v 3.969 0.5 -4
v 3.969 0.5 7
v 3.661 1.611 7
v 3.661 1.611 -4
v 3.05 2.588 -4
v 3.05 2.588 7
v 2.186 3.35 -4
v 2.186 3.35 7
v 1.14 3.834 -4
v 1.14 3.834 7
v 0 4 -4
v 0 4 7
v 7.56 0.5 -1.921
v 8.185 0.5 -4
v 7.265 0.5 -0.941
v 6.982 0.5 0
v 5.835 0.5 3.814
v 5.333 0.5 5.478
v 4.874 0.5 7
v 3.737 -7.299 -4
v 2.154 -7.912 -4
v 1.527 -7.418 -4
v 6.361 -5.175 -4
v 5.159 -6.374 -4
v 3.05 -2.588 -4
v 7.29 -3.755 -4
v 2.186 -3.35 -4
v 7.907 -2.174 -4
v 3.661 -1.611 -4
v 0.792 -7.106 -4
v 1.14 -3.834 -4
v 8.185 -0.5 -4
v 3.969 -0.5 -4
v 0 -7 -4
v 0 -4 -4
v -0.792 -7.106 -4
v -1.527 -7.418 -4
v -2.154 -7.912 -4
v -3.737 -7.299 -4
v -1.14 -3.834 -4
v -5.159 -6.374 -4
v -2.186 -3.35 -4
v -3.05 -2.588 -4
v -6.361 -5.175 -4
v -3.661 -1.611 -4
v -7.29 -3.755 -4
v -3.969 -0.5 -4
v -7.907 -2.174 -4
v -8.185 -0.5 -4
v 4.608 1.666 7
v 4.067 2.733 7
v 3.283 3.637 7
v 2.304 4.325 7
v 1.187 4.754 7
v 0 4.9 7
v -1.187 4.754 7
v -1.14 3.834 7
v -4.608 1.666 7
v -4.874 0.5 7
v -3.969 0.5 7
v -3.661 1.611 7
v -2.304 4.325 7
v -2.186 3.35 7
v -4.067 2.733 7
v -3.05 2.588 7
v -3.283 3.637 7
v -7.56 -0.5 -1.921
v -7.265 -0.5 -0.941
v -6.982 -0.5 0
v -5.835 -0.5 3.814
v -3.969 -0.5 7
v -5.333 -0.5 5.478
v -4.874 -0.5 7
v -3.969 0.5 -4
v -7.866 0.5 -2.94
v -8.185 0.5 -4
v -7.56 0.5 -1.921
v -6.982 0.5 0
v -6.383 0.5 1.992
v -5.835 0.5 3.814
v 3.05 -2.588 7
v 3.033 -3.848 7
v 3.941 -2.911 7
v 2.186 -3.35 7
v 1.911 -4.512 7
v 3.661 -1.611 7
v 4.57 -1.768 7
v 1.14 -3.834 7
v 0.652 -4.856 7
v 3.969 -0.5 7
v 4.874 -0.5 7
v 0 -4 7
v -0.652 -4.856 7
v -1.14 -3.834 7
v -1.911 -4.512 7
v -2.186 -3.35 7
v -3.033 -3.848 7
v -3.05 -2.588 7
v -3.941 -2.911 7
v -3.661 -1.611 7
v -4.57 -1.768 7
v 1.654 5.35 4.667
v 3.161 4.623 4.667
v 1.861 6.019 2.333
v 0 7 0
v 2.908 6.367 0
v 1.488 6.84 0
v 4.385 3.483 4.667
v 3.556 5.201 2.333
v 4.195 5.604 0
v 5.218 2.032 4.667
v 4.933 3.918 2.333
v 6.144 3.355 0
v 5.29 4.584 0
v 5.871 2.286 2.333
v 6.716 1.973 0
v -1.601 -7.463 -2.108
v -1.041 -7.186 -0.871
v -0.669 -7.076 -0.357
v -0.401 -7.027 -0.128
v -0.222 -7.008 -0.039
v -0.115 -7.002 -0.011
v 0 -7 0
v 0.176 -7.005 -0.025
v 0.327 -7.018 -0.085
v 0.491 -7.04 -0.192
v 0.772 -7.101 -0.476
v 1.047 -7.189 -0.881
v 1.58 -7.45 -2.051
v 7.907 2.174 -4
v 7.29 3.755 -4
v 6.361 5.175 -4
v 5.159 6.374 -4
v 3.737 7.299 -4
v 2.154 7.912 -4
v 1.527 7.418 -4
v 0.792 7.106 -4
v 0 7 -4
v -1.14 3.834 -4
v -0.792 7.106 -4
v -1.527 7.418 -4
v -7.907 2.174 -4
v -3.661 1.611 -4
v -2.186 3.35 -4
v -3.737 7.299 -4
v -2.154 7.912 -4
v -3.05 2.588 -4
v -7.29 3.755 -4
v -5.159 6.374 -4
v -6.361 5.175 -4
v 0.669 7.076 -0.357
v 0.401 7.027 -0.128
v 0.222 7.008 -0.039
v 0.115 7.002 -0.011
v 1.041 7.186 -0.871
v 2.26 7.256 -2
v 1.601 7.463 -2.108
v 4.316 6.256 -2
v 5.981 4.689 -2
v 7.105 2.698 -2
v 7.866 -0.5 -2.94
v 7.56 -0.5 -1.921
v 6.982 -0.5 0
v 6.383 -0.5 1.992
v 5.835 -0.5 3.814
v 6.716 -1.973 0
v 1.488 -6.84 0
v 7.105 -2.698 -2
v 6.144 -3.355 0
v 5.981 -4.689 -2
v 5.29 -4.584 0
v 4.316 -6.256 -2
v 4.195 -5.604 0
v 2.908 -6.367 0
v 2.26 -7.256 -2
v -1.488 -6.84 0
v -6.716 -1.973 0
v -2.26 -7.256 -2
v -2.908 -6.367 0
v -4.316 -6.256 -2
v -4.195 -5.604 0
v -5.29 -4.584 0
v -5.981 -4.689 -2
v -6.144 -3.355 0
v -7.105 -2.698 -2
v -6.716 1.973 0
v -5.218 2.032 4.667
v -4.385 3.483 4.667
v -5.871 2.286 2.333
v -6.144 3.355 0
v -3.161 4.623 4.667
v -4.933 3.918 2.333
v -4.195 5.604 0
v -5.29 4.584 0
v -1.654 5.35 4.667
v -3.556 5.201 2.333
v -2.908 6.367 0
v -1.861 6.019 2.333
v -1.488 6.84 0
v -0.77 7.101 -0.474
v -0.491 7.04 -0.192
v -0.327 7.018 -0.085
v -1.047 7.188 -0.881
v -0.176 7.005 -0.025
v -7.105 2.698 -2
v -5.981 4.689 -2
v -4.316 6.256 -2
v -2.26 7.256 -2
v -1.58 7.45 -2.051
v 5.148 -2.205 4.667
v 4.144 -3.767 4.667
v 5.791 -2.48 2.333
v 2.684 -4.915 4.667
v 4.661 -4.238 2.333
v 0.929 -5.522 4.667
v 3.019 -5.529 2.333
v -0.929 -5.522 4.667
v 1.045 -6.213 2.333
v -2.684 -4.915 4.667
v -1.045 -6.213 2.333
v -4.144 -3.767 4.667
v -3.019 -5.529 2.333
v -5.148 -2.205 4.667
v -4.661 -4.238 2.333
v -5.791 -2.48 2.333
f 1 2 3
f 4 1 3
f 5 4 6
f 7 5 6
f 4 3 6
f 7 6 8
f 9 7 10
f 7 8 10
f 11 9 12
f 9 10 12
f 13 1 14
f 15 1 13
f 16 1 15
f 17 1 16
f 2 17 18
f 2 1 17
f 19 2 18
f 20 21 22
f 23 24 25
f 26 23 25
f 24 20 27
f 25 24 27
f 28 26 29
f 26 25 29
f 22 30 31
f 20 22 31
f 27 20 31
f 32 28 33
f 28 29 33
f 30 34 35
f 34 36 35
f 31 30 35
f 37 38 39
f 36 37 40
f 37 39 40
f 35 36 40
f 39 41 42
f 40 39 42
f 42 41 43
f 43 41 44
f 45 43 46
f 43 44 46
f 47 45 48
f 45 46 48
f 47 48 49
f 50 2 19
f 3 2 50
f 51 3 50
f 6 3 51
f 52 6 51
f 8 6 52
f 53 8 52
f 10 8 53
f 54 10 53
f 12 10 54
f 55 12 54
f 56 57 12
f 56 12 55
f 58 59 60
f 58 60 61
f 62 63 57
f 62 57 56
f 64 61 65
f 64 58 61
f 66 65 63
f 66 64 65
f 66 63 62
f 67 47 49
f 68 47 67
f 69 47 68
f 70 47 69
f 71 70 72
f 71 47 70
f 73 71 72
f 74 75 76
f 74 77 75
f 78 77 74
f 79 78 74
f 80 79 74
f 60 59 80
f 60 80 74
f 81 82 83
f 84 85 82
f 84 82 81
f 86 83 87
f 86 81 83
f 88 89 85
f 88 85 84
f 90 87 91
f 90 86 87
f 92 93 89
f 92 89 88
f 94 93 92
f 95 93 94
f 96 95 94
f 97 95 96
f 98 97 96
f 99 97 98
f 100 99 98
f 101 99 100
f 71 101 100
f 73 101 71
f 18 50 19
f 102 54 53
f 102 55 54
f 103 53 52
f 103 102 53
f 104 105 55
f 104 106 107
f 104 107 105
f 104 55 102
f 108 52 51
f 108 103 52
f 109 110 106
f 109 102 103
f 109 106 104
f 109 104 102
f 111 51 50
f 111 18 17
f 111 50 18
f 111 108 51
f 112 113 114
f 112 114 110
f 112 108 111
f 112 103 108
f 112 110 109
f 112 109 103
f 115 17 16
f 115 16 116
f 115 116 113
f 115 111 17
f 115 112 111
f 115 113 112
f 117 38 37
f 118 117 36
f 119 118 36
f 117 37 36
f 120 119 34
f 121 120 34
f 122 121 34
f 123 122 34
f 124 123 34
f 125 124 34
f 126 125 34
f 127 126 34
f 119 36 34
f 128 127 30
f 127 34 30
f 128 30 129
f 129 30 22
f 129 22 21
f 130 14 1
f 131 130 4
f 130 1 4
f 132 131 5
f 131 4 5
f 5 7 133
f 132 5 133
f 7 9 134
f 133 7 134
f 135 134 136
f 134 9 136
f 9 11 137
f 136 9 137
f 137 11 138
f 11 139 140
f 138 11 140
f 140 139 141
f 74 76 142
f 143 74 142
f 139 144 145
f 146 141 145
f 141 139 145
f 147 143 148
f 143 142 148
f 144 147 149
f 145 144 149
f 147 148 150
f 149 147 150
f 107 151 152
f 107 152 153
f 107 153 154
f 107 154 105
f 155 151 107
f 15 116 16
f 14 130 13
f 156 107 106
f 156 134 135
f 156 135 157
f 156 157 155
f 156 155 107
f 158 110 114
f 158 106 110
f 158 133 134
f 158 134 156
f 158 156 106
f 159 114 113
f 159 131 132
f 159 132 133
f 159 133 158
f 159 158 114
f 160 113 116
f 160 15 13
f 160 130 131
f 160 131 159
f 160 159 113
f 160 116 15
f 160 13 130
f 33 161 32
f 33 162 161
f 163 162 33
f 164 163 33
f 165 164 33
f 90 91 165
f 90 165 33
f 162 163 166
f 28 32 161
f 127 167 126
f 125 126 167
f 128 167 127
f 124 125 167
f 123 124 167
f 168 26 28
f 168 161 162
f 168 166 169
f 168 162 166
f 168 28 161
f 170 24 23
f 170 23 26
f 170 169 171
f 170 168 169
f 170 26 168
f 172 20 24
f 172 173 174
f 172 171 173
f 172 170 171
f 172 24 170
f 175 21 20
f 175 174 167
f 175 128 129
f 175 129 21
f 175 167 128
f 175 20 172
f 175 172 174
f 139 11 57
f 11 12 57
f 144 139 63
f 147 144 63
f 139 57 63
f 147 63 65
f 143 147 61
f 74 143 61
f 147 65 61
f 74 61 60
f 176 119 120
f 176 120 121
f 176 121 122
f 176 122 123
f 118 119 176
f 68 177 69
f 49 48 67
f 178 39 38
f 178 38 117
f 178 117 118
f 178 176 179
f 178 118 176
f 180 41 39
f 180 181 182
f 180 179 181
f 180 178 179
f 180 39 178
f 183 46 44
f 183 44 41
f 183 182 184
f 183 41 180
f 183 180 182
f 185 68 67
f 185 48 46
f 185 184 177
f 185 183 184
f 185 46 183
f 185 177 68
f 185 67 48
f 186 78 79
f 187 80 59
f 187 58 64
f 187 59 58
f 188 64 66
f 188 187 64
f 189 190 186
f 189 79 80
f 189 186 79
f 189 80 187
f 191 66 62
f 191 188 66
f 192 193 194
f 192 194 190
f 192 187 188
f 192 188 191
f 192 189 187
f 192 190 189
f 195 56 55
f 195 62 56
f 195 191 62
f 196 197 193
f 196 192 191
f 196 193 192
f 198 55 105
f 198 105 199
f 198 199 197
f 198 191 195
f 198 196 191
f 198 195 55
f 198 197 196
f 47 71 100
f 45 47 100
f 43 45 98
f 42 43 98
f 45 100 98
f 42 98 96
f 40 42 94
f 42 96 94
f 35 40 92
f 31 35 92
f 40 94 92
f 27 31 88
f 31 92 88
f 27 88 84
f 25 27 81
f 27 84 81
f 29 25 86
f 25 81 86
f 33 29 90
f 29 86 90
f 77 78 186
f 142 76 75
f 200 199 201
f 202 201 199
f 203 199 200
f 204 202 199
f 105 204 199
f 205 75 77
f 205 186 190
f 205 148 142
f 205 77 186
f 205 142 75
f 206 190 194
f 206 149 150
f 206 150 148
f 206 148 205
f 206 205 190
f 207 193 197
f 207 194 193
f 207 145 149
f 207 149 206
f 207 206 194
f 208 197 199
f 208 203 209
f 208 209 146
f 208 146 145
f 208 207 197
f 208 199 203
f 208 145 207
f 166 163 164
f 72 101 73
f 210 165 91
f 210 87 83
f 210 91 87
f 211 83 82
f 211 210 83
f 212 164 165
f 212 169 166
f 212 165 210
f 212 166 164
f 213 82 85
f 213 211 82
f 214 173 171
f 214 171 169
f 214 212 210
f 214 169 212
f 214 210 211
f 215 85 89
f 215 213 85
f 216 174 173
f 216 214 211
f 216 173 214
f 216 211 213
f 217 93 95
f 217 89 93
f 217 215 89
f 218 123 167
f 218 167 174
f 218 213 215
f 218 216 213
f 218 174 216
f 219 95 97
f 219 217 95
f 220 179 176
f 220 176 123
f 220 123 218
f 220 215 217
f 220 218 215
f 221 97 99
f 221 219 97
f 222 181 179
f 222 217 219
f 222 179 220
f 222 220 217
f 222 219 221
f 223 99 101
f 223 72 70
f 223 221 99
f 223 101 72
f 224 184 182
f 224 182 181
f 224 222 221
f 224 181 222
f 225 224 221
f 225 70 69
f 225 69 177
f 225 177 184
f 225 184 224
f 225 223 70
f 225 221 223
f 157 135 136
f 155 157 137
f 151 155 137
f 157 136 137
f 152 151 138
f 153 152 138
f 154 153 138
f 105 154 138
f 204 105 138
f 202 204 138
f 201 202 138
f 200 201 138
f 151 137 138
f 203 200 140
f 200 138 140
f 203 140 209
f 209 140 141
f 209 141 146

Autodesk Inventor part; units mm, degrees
ref_plane "YZ Plane" through (0, 0, 0) normal (1, 0, 0) x (0, 1, 0)
ref_plane "XZ Plane" through (0, 0, 0) normal (0, 1, 0) x (-1, 0, 0)
ref_plane "XY Plane" through (0, 0, 0) normal (0, 0, 1) x (1, 0, 0)
sketch "Sketch1" plane through (0, 0, 0) normal (1, 0, 0) x (0, 1, 0)
  line L0 (0, 0) -> (4, 0) construction
  line L1 (4, 0) -> (4, 7)
  line L2 (4, 7) -> (4.9, 7)
  line L3 (4.9, 7) -> (7, 0)
  line L4 (7, 0) -> (4, 0)
  line L5 (4, 7) -> (4, 10) construction
  line L6 (4, 10) -> (4.9, 7) construction
  line L7 (4, 0) -> (4, -4)
  line L8 (4, -4) -> (8.2, -4)
  line L9 (8.2, -4) -> (7, 0)
  line L10 (0, 0) -> (0, 5.7266)
  dimension "d0" = 3
  dimension "d1" = 4
  dimension "d2" = 10
  dimension "d3" = 7
  dimension "d4" = 4
revolve "Revolution1" add sketch "Sketch1" angle 360 about axis through (0, 0, 0) along (0, 0, 1)
sketch "Sketch2" plane through (0, 0, 7) normal (0, 0, 1) x (1, 0, 0)
  circle A0 centre (0, 0) radius 4.9 projected
  line L0 (10, -0.5) -> (-10, -0.5)
  line L1 (-10, -0.5) -> (-10, 0.5)
  line L2 (-10, 0.5) -> (10, 0.5)
  line L3 (10, 0.5) -> (10, -0.5)
  line L4 (10, -0.5) -> (-10, 0.5) construction
  line L5 (-10, -0.5) -> (10, 0.5) construction
  dimension "d6" = 1
  dimension "d7" = 20
extrude "Extrusion1" cut sketch "Sketch2" against normal through all contours A0 L0 L2 | A0 L2 L3 L0 | A0 L0 L1 L2
sketch "Sketch3" plane through (0, 0, -4) normal (0, 0, -1) x (-1, 0, 0)
  arc A0 (-3.9686, -0.5) -> (3.9686, -0.5) centre (0, 0) ccw projected
  line L0 (-3.9686, -0.5) -> (-8.1847, -0.5) projected
  line L1 (0, 10) -> (0, -10)
  circle A1 centre (0, 10) radius 3
  circle A2 centre (0, -10) radius 3
  dimension "d10" = 20
  dimension "d11" = 6
extrude "Extrusion2" cut sketch "Sketch3" against normal through all
properties part number "shaft collar"
